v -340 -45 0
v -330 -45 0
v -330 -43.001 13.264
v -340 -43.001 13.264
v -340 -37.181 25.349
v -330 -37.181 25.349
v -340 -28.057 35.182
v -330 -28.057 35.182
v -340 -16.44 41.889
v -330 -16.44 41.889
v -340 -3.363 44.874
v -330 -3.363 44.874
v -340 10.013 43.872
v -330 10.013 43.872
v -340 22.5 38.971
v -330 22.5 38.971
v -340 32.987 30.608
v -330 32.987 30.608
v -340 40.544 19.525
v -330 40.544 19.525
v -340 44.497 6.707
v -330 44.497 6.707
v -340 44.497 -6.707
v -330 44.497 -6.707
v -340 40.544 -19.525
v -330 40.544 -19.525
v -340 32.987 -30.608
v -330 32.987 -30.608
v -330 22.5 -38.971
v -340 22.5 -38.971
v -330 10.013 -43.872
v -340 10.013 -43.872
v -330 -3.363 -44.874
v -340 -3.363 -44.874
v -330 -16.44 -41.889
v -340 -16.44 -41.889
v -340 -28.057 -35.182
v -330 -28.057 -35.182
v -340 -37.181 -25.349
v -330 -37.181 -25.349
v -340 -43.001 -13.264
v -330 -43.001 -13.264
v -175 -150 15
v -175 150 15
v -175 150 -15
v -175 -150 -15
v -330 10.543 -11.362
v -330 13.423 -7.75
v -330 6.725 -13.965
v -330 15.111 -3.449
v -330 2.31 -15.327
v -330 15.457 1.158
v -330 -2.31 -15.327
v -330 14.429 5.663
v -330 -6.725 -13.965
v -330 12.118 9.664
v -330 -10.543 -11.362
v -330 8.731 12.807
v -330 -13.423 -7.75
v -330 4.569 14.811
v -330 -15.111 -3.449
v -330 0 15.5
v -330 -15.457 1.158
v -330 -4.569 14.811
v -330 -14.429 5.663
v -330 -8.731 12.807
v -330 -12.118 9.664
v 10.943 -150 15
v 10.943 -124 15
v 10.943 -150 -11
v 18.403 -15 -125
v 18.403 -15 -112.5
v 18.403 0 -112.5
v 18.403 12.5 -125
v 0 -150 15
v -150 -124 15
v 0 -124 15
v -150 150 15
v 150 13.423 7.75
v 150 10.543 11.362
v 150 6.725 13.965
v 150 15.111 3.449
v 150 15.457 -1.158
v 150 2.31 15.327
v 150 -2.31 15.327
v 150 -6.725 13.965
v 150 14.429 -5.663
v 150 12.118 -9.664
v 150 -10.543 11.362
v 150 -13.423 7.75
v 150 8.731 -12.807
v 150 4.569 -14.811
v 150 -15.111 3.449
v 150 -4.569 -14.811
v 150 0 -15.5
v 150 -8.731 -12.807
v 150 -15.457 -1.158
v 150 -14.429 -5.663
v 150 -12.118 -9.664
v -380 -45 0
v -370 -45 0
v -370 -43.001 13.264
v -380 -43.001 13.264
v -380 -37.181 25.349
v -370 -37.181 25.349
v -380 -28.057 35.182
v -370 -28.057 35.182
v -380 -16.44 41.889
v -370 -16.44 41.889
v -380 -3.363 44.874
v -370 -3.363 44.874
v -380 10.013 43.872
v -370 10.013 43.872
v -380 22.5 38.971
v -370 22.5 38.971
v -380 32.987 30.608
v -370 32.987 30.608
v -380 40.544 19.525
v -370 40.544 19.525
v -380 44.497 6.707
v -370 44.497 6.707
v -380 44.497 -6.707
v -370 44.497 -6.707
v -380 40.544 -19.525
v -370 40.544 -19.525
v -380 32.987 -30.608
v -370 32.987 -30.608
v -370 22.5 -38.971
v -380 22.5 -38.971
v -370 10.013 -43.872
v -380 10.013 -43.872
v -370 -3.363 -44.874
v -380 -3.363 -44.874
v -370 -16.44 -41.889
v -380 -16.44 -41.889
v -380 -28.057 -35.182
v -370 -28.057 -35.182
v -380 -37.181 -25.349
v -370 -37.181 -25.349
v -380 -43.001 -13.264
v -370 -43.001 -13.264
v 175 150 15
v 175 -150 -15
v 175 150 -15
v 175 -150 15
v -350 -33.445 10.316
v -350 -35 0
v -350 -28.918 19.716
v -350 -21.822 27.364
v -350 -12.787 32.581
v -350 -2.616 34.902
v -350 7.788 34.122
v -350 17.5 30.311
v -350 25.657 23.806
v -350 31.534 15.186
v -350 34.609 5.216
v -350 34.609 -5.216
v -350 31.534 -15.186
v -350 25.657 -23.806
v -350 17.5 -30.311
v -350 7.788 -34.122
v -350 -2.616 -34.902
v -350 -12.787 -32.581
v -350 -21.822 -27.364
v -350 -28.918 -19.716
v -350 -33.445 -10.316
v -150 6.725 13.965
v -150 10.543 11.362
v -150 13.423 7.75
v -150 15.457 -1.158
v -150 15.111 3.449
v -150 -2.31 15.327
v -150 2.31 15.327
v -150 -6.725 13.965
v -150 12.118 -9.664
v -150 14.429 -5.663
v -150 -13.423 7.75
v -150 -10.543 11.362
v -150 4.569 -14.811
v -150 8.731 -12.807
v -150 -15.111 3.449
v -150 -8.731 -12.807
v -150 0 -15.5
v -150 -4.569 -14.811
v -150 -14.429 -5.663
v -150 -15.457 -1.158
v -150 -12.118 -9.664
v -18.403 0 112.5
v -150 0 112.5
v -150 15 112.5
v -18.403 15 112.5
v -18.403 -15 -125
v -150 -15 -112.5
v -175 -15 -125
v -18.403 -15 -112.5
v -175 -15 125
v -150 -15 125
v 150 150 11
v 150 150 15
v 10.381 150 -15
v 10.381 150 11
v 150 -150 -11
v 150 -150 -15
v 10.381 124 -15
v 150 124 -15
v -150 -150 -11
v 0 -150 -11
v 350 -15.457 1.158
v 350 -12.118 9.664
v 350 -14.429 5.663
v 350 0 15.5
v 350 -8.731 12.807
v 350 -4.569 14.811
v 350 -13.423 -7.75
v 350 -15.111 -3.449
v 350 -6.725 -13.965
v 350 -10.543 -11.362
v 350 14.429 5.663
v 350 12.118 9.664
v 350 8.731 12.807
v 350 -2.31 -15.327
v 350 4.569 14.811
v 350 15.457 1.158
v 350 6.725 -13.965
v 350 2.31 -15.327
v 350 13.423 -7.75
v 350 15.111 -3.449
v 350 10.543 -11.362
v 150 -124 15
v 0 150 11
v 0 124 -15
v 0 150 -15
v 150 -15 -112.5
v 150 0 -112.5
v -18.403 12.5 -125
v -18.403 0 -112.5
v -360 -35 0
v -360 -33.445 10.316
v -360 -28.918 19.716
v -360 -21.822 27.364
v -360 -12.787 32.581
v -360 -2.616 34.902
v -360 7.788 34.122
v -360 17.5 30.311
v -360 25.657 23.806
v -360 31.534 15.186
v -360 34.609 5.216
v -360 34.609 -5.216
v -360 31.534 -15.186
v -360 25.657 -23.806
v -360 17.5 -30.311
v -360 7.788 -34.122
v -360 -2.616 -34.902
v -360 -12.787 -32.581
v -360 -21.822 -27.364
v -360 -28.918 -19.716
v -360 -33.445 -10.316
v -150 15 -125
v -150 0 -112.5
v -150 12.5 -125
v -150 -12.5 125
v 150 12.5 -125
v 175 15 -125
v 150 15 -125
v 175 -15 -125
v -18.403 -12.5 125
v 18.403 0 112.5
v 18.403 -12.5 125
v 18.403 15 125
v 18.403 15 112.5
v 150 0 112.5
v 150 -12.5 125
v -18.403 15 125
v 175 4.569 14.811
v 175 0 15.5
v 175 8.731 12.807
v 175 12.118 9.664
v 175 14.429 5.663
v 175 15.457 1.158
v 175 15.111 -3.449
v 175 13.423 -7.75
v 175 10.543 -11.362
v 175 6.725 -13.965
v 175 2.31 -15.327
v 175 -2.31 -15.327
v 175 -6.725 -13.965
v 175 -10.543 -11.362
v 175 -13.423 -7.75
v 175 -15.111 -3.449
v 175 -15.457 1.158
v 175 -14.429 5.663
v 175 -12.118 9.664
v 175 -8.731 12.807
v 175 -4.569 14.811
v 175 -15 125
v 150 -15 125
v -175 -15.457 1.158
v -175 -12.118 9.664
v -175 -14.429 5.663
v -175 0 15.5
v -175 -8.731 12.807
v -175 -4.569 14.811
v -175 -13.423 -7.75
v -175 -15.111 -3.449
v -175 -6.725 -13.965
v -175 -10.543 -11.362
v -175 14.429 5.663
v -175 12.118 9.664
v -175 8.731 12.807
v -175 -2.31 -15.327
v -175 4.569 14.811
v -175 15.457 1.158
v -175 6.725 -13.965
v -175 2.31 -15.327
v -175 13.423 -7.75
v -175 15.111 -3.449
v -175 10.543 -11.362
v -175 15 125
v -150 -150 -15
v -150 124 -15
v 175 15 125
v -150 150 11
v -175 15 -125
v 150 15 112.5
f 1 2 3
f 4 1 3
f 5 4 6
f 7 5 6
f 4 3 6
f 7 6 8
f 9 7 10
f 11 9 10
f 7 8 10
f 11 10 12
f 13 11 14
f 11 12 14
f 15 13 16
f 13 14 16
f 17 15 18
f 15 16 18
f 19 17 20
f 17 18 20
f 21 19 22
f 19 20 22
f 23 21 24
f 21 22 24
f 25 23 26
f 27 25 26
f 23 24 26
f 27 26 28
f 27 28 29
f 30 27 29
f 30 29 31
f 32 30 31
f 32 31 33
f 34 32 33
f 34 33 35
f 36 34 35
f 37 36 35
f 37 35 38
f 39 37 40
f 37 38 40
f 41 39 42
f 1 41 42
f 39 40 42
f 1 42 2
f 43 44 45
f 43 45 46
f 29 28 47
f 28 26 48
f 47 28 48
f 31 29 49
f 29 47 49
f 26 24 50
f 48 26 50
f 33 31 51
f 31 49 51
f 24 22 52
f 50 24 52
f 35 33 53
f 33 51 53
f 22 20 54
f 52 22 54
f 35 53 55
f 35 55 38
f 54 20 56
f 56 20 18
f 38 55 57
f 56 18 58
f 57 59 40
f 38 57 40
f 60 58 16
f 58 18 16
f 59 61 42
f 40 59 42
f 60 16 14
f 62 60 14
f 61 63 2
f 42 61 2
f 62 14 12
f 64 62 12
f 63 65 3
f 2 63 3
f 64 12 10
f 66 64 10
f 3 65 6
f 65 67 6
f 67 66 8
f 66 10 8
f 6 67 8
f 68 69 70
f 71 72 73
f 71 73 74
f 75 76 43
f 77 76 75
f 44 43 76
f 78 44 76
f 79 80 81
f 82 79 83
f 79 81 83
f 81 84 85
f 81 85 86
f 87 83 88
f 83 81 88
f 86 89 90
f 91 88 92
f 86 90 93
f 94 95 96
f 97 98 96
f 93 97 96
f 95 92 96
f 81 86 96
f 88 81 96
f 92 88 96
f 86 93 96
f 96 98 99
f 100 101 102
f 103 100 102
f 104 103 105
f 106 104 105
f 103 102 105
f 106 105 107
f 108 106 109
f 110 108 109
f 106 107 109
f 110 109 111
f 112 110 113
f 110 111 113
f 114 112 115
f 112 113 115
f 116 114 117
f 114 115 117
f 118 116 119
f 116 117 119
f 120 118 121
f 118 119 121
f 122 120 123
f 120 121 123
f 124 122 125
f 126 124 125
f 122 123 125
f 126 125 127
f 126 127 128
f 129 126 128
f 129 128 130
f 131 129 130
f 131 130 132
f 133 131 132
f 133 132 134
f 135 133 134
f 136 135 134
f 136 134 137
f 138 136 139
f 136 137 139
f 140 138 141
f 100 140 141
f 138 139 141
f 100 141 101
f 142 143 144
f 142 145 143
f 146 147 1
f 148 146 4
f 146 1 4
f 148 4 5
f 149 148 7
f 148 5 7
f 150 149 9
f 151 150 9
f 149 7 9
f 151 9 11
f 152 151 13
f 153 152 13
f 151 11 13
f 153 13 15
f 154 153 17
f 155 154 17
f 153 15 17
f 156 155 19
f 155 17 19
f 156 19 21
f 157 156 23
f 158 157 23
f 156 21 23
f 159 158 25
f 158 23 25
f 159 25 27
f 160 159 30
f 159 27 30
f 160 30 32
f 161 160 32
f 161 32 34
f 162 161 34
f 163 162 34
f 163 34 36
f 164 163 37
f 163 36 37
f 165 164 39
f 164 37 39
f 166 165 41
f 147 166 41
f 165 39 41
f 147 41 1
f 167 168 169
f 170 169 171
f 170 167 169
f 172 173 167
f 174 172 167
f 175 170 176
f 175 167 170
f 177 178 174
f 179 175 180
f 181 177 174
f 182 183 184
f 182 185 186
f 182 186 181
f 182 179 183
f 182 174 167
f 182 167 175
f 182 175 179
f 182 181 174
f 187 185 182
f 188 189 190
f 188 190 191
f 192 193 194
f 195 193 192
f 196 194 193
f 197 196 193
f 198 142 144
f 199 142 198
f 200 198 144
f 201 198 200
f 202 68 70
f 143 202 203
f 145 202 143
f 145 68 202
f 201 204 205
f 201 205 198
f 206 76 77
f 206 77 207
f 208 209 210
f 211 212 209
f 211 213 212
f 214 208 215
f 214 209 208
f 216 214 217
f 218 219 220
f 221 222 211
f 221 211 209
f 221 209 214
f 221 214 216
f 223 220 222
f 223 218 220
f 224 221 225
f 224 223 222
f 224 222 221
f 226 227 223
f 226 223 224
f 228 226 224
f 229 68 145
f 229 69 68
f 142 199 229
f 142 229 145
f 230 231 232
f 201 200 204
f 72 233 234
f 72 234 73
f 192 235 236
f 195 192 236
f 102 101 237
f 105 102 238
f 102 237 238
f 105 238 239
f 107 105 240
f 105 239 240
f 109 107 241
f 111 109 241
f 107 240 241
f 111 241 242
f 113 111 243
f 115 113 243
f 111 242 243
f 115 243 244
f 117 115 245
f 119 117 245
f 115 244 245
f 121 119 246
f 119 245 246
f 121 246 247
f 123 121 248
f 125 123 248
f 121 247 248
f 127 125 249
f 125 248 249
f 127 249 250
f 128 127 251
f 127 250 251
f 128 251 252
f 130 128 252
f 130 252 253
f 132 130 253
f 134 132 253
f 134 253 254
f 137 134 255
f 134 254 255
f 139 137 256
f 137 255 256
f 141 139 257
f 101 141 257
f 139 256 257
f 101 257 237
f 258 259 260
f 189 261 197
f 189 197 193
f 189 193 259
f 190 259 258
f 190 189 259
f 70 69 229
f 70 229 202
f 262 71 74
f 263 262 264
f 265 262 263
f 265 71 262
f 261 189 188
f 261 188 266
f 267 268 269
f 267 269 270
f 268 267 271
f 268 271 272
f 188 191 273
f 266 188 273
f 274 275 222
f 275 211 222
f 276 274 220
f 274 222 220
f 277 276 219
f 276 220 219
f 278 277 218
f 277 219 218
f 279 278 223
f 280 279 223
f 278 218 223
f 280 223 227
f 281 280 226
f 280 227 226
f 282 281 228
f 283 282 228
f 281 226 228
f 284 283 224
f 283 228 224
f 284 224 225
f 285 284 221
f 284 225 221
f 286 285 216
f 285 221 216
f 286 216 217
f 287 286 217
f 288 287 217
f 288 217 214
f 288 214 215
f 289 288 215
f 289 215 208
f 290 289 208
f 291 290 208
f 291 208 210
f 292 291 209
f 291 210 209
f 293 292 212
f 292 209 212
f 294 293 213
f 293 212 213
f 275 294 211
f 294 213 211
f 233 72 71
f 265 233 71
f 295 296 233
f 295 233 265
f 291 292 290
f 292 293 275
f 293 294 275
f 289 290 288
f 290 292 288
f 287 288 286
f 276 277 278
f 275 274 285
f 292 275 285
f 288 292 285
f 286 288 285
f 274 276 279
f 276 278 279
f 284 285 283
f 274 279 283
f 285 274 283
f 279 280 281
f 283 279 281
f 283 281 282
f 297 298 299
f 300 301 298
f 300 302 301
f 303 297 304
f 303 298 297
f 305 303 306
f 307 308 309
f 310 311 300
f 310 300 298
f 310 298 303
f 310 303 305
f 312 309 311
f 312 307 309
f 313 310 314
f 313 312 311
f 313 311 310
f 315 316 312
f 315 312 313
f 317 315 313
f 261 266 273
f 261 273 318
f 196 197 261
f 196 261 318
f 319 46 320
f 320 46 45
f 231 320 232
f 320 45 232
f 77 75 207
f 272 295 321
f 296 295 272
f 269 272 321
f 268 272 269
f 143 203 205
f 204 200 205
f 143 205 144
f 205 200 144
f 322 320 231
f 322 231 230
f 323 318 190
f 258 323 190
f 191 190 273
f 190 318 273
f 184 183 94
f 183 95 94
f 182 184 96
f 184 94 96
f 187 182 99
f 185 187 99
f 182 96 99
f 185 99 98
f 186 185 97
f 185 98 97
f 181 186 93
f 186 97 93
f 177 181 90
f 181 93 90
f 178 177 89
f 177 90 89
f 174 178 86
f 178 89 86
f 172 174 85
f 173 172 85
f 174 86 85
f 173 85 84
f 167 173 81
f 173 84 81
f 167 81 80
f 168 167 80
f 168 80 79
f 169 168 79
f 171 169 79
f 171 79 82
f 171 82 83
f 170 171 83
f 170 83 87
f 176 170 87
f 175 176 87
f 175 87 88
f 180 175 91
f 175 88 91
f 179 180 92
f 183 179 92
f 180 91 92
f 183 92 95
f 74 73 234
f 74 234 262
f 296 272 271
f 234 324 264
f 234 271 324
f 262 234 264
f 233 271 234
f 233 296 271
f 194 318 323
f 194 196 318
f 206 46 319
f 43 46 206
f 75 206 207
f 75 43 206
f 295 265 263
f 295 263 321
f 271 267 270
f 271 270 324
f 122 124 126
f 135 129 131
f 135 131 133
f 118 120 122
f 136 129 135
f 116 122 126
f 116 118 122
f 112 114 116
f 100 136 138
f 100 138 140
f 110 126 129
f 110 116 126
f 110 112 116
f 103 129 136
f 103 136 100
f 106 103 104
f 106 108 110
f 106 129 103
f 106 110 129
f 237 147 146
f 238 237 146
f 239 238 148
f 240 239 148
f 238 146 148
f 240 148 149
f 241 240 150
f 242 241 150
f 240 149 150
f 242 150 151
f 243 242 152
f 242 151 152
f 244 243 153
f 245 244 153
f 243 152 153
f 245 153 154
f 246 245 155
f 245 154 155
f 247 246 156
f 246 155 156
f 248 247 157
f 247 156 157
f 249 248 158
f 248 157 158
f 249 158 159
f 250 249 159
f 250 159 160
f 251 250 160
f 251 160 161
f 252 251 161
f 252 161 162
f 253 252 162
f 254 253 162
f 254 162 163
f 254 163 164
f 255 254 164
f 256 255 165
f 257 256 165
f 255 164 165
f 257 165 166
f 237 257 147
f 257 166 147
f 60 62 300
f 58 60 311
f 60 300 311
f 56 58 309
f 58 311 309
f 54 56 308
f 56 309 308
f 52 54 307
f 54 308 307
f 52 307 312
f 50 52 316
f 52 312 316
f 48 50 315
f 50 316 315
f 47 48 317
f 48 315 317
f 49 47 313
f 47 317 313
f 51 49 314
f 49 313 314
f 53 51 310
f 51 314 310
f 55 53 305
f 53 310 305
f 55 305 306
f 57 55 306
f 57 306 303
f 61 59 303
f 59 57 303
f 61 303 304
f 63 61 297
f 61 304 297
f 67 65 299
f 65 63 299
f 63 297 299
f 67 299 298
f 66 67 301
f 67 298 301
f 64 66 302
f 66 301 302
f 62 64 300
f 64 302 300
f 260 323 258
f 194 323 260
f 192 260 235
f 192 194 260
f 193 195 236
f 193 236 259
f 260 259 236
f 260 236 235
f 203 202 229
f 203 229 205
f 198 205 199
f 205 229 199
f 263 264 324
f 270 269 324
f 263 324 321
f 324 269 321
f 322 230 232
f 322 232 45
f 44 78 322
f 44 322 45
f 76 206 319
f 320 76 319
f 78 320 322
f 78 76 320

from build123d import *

# Parameters (mm, degrees)
F0_W           = 175
F0_H           = 15.5
F0_W_2         = 25
F2_DEPTH       = 15
F4_DEPTH       = 15
F5_T1_DEPTH    = 150
F5_2_T1_DEPTH  = 139.6191499531
F5_2_T3_DEPTH  = 139.0574328601
F6_R           = 50
F7_DEPTH       = 20
F8_R           = 45
F9_DEPTH       = 20
F10_R          = 35
F11_DEPTH      = 10
F12_R          = 45
F13_DEPTH      = 20
F14_SIZE       = 9.99999
F15_T1_DEPTH   = 170.1724504435
F15_2_T1_DEPTH = 170.1724504435
F16_T1_DEPTH   = 170.1724504435
F16_2_T1_DEPTH = 170.1724504435
F0_W_3         = 300


# Not quite as in the source:
# - a fillet or chamfer that OpenCascade refuses, or shapes differently, is made with other operations: its cross-section is extruded or revolved along the edge and cut away or added
# - a fillet or chamfer is up to 0.001 mm smaller than in the source, because OpenCascade refuses the exact size
# - a feature names something its author has since deleted; it is built from what else it names


with BuildPart() as f1:
    # F0 (on Front) → F1 (revolve)
    with BuildSketch(Plane.XZ):
        with Locations((262.5, 7.75)):
            Rectangle(F0_W, F0_H)
    revolve(axis=Axis((0, 0, 0), (-1, 0, 0)))


with BuildPart() as f1b:
    # F0 (on Front) → F1, piece 2 (revolve)
    with BuildSketch(Plane.XZ):
        with Locations((-262.5, 7.75)):
            Rectangle(F0_W, F0_H)
    revolve(axis=Axis((0, 0, 0), (-1, 0, 0)))

    # F6 (on face) → F7 (cut)
    with BuildSketch(Plane(origin=(-350, 0, 0), x_dir=(0, -1, 0), z_dir=(-1, 0, 0))):
        Circle(F6_R)
    extrude(amount=-F7_DEPTH, mode=Mode.SUBTRACT)

    # F8 (on face) → F9 (join)
    with BuildSketch(Plane(origin=(-330, 0, 0), x_dir=(0, -1, 0), z_dir=(-1, 0, 0))):
        Circle(F8_R)
    extrude(amount=F9_DEPTH)

    # F10 (on face) → F11 (join)
    with BuildSketch(Plane(origin=(-350, 0, 0), x_dir=(0, -1, 0), z_dir=(-1, 0, 0))):
        Circle(F10_R)
    extrude(amount=F11_DEPTH)

    # F12 (on face) → F13 (join)
    with BuildSketch(Plane(origin=(-360, 0, 0), x_dir=(0, -1, 0), z_dir=(-1, 0, 0))):
        Circle(F12_R)
    extrude(amount=F13_DEPTH)

    # F14 (size 10 in the source; OpenCascade refuses exactly that, so slightly less here)
    f14_edges = [f1b.edges().sort_by_distance(p)[0] for p in [
        (-350, 45, 0),
        (-360, 45, 0),
    ]]
    chamfer(f14_edges, length=F14_SIZE)


with BuildPart() as f2:
    # F0 (on Front) → F2 (new body, symmetric)
    with BuildSketch(Plane.XZ):
        Polygon((-150, -15.5), (-175, -15.5), (-175, -125), (-18.402794376, -125), (-18.402794376, -112.5), (-150, -112.5), align=None)
        Polygon((-175, 125), (-175, 15.5), (-150, 15.5), (-150, 112.5), (-18.402794376, 112.5), (-18.402794376, 125), align=None)
        with Locations((-162.5, 7.75)):
            Rectangle(F0_W_2, F0_H)
        with Locations((-162.5, -7.75)):
            Rectangle(F0_W_2, F0_H)
    extrude(amount=F2_DEPTH, both=True)

    # F15: chamfer of 15 on 1 edges, made by hand

    # F15_s2 → F15_t1 (cut)
    with BuildSketch(Plane.YZ.offset(-150)):
        Polygon((0, 112.5), (-15, 127.5), (-15, 112.5), align=None)
    extrude(amount=F15_T1_DEPTH, mode=Mode.SUBTRACT)

    # F16: chamfer of 15 on 1 edges, made by hand

    # F16_s2 → F16_t1 (cut)
    with BuildSketch(Plane.YZ.offset(-150)):
        Polygon((0, -112.5), (15, -127.5), (15, -112.5), align=None)
    extrude(amount=F16_T1_DEPTH, mode=Mode.SUBTRACT)


with BuildPart() as f2b:
    # F0 (on Front) → F2, piece 2 (new body, symmetric)
    with BuildSketch(Plane.XZ):
        Polygon((175, -15.5), (150, -15.5), (150, -112.5), (18.402794376, -112.5), (18.402794376, -125), (175, -125), align=None)
        Polygon((150, 112.5), (150, 15.5), (175, 15.5), (175, 125), (18.402794376, 125), (18.402794376, 112.5), align=None)
        with Locations((162.5, 7.75)):
            Rectangle(F0_W_2, F0_H)
        with Locations((162.5, -7.75)):
            Rectangle(F0_W_2, F0_H)
    extrude(amount=F2_DEPTH, both=True)

    # F15#2: chamfer of 15 on 1 edges, made by hand

    # F15_2_s2 → F15_2_t1 (cut)
    with BuildSketch(Plane.YZ.offset(-20.1724504435)):
        Polygon((0, 112.5), (-15, 127.5), (-15, 112.5), align=None)
    extrude(amount=F15_2_T1_DEPTH, mode=Mode.SUBTRACT)

    # F16#2: chamfer of 15 on 1 edges, made by hand

    # F16_2_s2 → F16_2_t1 (cut)
    with BuildSketch(Plane.YZ.offset(-20.1724504435)):
        Polygon((0, -112.5), (15, -127.5), (15, -112.5), align=None)
    extrude(amount=F16_2_T1_DEPTH, mode=Mode.SUBTRACT)


with BuildPart() as f4:
    # F3 (on Top) → F4 (new body, symmetric)
    with BuildSketch(Plane.XY):
        Polygon((175, -150), (175, 150), (10.3808500469, 150), (10.3808500469, 124), (150, 124), (150, -124), (10.9425671399, -124), (10.9425671399, -150), align=None)
    extrude(amount=F4_DEPTH, both=True)

    # F5#2: chamfer of 30 on 2 edges, made by hand

    # F5_2_s2 → F5_2_t1 (cut)
    with BuildSketch(Plane.YZ.offset(10.3808500469)):
        with BuildLine():
            Line((123.1514718626, -15.8485281374), (154.8485281374, 15.8485281374))
            Line((154.8485281374, 15.8485281374), (154.8485281374, 16.4485281374))
            ThreePointArc((154.8485281374, 16.4485281374), (139.4242640687, 15.6), (124, 15.6))
            Line((124, 15.6), (123.4, 15))
            ThreePointArc((123.4, 15), (123.4, -0.4242640687), (122.5514718626, -15.8485281374))
            Line((122.5514718626, -15.8485281374), (123.1514718626, -15.8485281374))
        make_face()
    extrude(amount=F5_2_T1_DEPTH, mode=Mode.SUBTRACT)

    # F5_2_s4 → F5_2_t3 (cut)
    with BuildSketch(Plane.YZ.offset(10.9425671399)):
        with BuildLine():
            Line((-123.1514718626, 15.8485281374), (-154.8485281374, -15.8485281374))
            Line((-154.8485281374, -15.8485281374), (-154.8485281374, -16.4485281374))
            ThreePointArc((-154.8485281374, -16.4485281374), (-139.4242640687, -15.6), (-124, -15.6))
            Line((-124, -15.6), (-123.4, -15))
            ThreePointArc((-123.4, -15), (-123.4, 0.4242640687), (-122.5514718626, 15.8485281374))
            Line((-122.5514718626, 15.8485281374), (-123.1514718626, 15.8485281374))
        make_face()
    extrude(amount=F5_2_T3_DEPTH, mode=Mode.SUBTRACT)


with BuildPart() as f4b:
    # F3 (on Top) → F4, piece 2 (new body, symmetric)
    with BuildSketch(Plane.XY):
        Polygon((0, 150), (-175, 150), (-175, -150), (0, -150), (0, -124), (-150, -124), (-150, 124), (0, 124), align=None)
    extrude(amount=F4_DEPTH, both=True)

    # F5: chamfer of 30 on 2 edges, made by hand

    # F5_s2 → F5_t1 (cut)
    with BuildSketch(Plane.YZ.offset(-150)):
        with BuildLine():
            Line((123.1514718626, -15.8485281374), (154.8485281374, 15.8485281374))
            Line((154.8485281374, 15.8485281374), (154.8485281374, 16.4485281374))
            ThreePointArc((154.8485281374, 16.4485281374), (139.4242640687, 15.6), (124, 15.6))
            Line((124, 15.6), (123.4, 15))
            ThreePointArc((123.4, 15), (123.4, -0.4242640687), (122.5514718626, -15.8485281374))
            Line((122.5514718626, -15.8485281374), (123.1514718626, -15.8485281374))
        make_face()
        with BuildLine():
            Line((-123.1514718626, 15.8485281374), (-154.8485281374, -15.8485281374))
            Line((-154.8485281374, -15.8485281374), (-154.8485281374, -16.4485281374))
            ThreePointArc((-154.8485281374, -16.4485281374), (-139.4242640687, -15.6), (-124, -15.6))
            Line((-124, -15.6), (-123.4, -15))
            ThreePointArc((-123.4, -15), (-123.4, 0.4242640687), (-122.5514718626, 15.8485281374))
            Line((-122.5514718626, 15.8485281374), (-123.1514718626, 15.8485281374))
        make_face()
    extrude(amount=F5_T1_DEPTH, mode=Mode.SUBTRACT)


with BuildPart() as f17:
    # F0 (on Front) → F17 (revolve)
    with BuildSketch(Plane.XZ):
        with Locations((0, -7.75)):
            Rectangle(F0_W_3, F0_H)
    revolve(axis=Axis((0, 0, 0), (-1, 0, 0)))


solid = Compound([f1.part, f1b.part, f2.part, f2b.part, f4.part, f4b.part, f17.part])
